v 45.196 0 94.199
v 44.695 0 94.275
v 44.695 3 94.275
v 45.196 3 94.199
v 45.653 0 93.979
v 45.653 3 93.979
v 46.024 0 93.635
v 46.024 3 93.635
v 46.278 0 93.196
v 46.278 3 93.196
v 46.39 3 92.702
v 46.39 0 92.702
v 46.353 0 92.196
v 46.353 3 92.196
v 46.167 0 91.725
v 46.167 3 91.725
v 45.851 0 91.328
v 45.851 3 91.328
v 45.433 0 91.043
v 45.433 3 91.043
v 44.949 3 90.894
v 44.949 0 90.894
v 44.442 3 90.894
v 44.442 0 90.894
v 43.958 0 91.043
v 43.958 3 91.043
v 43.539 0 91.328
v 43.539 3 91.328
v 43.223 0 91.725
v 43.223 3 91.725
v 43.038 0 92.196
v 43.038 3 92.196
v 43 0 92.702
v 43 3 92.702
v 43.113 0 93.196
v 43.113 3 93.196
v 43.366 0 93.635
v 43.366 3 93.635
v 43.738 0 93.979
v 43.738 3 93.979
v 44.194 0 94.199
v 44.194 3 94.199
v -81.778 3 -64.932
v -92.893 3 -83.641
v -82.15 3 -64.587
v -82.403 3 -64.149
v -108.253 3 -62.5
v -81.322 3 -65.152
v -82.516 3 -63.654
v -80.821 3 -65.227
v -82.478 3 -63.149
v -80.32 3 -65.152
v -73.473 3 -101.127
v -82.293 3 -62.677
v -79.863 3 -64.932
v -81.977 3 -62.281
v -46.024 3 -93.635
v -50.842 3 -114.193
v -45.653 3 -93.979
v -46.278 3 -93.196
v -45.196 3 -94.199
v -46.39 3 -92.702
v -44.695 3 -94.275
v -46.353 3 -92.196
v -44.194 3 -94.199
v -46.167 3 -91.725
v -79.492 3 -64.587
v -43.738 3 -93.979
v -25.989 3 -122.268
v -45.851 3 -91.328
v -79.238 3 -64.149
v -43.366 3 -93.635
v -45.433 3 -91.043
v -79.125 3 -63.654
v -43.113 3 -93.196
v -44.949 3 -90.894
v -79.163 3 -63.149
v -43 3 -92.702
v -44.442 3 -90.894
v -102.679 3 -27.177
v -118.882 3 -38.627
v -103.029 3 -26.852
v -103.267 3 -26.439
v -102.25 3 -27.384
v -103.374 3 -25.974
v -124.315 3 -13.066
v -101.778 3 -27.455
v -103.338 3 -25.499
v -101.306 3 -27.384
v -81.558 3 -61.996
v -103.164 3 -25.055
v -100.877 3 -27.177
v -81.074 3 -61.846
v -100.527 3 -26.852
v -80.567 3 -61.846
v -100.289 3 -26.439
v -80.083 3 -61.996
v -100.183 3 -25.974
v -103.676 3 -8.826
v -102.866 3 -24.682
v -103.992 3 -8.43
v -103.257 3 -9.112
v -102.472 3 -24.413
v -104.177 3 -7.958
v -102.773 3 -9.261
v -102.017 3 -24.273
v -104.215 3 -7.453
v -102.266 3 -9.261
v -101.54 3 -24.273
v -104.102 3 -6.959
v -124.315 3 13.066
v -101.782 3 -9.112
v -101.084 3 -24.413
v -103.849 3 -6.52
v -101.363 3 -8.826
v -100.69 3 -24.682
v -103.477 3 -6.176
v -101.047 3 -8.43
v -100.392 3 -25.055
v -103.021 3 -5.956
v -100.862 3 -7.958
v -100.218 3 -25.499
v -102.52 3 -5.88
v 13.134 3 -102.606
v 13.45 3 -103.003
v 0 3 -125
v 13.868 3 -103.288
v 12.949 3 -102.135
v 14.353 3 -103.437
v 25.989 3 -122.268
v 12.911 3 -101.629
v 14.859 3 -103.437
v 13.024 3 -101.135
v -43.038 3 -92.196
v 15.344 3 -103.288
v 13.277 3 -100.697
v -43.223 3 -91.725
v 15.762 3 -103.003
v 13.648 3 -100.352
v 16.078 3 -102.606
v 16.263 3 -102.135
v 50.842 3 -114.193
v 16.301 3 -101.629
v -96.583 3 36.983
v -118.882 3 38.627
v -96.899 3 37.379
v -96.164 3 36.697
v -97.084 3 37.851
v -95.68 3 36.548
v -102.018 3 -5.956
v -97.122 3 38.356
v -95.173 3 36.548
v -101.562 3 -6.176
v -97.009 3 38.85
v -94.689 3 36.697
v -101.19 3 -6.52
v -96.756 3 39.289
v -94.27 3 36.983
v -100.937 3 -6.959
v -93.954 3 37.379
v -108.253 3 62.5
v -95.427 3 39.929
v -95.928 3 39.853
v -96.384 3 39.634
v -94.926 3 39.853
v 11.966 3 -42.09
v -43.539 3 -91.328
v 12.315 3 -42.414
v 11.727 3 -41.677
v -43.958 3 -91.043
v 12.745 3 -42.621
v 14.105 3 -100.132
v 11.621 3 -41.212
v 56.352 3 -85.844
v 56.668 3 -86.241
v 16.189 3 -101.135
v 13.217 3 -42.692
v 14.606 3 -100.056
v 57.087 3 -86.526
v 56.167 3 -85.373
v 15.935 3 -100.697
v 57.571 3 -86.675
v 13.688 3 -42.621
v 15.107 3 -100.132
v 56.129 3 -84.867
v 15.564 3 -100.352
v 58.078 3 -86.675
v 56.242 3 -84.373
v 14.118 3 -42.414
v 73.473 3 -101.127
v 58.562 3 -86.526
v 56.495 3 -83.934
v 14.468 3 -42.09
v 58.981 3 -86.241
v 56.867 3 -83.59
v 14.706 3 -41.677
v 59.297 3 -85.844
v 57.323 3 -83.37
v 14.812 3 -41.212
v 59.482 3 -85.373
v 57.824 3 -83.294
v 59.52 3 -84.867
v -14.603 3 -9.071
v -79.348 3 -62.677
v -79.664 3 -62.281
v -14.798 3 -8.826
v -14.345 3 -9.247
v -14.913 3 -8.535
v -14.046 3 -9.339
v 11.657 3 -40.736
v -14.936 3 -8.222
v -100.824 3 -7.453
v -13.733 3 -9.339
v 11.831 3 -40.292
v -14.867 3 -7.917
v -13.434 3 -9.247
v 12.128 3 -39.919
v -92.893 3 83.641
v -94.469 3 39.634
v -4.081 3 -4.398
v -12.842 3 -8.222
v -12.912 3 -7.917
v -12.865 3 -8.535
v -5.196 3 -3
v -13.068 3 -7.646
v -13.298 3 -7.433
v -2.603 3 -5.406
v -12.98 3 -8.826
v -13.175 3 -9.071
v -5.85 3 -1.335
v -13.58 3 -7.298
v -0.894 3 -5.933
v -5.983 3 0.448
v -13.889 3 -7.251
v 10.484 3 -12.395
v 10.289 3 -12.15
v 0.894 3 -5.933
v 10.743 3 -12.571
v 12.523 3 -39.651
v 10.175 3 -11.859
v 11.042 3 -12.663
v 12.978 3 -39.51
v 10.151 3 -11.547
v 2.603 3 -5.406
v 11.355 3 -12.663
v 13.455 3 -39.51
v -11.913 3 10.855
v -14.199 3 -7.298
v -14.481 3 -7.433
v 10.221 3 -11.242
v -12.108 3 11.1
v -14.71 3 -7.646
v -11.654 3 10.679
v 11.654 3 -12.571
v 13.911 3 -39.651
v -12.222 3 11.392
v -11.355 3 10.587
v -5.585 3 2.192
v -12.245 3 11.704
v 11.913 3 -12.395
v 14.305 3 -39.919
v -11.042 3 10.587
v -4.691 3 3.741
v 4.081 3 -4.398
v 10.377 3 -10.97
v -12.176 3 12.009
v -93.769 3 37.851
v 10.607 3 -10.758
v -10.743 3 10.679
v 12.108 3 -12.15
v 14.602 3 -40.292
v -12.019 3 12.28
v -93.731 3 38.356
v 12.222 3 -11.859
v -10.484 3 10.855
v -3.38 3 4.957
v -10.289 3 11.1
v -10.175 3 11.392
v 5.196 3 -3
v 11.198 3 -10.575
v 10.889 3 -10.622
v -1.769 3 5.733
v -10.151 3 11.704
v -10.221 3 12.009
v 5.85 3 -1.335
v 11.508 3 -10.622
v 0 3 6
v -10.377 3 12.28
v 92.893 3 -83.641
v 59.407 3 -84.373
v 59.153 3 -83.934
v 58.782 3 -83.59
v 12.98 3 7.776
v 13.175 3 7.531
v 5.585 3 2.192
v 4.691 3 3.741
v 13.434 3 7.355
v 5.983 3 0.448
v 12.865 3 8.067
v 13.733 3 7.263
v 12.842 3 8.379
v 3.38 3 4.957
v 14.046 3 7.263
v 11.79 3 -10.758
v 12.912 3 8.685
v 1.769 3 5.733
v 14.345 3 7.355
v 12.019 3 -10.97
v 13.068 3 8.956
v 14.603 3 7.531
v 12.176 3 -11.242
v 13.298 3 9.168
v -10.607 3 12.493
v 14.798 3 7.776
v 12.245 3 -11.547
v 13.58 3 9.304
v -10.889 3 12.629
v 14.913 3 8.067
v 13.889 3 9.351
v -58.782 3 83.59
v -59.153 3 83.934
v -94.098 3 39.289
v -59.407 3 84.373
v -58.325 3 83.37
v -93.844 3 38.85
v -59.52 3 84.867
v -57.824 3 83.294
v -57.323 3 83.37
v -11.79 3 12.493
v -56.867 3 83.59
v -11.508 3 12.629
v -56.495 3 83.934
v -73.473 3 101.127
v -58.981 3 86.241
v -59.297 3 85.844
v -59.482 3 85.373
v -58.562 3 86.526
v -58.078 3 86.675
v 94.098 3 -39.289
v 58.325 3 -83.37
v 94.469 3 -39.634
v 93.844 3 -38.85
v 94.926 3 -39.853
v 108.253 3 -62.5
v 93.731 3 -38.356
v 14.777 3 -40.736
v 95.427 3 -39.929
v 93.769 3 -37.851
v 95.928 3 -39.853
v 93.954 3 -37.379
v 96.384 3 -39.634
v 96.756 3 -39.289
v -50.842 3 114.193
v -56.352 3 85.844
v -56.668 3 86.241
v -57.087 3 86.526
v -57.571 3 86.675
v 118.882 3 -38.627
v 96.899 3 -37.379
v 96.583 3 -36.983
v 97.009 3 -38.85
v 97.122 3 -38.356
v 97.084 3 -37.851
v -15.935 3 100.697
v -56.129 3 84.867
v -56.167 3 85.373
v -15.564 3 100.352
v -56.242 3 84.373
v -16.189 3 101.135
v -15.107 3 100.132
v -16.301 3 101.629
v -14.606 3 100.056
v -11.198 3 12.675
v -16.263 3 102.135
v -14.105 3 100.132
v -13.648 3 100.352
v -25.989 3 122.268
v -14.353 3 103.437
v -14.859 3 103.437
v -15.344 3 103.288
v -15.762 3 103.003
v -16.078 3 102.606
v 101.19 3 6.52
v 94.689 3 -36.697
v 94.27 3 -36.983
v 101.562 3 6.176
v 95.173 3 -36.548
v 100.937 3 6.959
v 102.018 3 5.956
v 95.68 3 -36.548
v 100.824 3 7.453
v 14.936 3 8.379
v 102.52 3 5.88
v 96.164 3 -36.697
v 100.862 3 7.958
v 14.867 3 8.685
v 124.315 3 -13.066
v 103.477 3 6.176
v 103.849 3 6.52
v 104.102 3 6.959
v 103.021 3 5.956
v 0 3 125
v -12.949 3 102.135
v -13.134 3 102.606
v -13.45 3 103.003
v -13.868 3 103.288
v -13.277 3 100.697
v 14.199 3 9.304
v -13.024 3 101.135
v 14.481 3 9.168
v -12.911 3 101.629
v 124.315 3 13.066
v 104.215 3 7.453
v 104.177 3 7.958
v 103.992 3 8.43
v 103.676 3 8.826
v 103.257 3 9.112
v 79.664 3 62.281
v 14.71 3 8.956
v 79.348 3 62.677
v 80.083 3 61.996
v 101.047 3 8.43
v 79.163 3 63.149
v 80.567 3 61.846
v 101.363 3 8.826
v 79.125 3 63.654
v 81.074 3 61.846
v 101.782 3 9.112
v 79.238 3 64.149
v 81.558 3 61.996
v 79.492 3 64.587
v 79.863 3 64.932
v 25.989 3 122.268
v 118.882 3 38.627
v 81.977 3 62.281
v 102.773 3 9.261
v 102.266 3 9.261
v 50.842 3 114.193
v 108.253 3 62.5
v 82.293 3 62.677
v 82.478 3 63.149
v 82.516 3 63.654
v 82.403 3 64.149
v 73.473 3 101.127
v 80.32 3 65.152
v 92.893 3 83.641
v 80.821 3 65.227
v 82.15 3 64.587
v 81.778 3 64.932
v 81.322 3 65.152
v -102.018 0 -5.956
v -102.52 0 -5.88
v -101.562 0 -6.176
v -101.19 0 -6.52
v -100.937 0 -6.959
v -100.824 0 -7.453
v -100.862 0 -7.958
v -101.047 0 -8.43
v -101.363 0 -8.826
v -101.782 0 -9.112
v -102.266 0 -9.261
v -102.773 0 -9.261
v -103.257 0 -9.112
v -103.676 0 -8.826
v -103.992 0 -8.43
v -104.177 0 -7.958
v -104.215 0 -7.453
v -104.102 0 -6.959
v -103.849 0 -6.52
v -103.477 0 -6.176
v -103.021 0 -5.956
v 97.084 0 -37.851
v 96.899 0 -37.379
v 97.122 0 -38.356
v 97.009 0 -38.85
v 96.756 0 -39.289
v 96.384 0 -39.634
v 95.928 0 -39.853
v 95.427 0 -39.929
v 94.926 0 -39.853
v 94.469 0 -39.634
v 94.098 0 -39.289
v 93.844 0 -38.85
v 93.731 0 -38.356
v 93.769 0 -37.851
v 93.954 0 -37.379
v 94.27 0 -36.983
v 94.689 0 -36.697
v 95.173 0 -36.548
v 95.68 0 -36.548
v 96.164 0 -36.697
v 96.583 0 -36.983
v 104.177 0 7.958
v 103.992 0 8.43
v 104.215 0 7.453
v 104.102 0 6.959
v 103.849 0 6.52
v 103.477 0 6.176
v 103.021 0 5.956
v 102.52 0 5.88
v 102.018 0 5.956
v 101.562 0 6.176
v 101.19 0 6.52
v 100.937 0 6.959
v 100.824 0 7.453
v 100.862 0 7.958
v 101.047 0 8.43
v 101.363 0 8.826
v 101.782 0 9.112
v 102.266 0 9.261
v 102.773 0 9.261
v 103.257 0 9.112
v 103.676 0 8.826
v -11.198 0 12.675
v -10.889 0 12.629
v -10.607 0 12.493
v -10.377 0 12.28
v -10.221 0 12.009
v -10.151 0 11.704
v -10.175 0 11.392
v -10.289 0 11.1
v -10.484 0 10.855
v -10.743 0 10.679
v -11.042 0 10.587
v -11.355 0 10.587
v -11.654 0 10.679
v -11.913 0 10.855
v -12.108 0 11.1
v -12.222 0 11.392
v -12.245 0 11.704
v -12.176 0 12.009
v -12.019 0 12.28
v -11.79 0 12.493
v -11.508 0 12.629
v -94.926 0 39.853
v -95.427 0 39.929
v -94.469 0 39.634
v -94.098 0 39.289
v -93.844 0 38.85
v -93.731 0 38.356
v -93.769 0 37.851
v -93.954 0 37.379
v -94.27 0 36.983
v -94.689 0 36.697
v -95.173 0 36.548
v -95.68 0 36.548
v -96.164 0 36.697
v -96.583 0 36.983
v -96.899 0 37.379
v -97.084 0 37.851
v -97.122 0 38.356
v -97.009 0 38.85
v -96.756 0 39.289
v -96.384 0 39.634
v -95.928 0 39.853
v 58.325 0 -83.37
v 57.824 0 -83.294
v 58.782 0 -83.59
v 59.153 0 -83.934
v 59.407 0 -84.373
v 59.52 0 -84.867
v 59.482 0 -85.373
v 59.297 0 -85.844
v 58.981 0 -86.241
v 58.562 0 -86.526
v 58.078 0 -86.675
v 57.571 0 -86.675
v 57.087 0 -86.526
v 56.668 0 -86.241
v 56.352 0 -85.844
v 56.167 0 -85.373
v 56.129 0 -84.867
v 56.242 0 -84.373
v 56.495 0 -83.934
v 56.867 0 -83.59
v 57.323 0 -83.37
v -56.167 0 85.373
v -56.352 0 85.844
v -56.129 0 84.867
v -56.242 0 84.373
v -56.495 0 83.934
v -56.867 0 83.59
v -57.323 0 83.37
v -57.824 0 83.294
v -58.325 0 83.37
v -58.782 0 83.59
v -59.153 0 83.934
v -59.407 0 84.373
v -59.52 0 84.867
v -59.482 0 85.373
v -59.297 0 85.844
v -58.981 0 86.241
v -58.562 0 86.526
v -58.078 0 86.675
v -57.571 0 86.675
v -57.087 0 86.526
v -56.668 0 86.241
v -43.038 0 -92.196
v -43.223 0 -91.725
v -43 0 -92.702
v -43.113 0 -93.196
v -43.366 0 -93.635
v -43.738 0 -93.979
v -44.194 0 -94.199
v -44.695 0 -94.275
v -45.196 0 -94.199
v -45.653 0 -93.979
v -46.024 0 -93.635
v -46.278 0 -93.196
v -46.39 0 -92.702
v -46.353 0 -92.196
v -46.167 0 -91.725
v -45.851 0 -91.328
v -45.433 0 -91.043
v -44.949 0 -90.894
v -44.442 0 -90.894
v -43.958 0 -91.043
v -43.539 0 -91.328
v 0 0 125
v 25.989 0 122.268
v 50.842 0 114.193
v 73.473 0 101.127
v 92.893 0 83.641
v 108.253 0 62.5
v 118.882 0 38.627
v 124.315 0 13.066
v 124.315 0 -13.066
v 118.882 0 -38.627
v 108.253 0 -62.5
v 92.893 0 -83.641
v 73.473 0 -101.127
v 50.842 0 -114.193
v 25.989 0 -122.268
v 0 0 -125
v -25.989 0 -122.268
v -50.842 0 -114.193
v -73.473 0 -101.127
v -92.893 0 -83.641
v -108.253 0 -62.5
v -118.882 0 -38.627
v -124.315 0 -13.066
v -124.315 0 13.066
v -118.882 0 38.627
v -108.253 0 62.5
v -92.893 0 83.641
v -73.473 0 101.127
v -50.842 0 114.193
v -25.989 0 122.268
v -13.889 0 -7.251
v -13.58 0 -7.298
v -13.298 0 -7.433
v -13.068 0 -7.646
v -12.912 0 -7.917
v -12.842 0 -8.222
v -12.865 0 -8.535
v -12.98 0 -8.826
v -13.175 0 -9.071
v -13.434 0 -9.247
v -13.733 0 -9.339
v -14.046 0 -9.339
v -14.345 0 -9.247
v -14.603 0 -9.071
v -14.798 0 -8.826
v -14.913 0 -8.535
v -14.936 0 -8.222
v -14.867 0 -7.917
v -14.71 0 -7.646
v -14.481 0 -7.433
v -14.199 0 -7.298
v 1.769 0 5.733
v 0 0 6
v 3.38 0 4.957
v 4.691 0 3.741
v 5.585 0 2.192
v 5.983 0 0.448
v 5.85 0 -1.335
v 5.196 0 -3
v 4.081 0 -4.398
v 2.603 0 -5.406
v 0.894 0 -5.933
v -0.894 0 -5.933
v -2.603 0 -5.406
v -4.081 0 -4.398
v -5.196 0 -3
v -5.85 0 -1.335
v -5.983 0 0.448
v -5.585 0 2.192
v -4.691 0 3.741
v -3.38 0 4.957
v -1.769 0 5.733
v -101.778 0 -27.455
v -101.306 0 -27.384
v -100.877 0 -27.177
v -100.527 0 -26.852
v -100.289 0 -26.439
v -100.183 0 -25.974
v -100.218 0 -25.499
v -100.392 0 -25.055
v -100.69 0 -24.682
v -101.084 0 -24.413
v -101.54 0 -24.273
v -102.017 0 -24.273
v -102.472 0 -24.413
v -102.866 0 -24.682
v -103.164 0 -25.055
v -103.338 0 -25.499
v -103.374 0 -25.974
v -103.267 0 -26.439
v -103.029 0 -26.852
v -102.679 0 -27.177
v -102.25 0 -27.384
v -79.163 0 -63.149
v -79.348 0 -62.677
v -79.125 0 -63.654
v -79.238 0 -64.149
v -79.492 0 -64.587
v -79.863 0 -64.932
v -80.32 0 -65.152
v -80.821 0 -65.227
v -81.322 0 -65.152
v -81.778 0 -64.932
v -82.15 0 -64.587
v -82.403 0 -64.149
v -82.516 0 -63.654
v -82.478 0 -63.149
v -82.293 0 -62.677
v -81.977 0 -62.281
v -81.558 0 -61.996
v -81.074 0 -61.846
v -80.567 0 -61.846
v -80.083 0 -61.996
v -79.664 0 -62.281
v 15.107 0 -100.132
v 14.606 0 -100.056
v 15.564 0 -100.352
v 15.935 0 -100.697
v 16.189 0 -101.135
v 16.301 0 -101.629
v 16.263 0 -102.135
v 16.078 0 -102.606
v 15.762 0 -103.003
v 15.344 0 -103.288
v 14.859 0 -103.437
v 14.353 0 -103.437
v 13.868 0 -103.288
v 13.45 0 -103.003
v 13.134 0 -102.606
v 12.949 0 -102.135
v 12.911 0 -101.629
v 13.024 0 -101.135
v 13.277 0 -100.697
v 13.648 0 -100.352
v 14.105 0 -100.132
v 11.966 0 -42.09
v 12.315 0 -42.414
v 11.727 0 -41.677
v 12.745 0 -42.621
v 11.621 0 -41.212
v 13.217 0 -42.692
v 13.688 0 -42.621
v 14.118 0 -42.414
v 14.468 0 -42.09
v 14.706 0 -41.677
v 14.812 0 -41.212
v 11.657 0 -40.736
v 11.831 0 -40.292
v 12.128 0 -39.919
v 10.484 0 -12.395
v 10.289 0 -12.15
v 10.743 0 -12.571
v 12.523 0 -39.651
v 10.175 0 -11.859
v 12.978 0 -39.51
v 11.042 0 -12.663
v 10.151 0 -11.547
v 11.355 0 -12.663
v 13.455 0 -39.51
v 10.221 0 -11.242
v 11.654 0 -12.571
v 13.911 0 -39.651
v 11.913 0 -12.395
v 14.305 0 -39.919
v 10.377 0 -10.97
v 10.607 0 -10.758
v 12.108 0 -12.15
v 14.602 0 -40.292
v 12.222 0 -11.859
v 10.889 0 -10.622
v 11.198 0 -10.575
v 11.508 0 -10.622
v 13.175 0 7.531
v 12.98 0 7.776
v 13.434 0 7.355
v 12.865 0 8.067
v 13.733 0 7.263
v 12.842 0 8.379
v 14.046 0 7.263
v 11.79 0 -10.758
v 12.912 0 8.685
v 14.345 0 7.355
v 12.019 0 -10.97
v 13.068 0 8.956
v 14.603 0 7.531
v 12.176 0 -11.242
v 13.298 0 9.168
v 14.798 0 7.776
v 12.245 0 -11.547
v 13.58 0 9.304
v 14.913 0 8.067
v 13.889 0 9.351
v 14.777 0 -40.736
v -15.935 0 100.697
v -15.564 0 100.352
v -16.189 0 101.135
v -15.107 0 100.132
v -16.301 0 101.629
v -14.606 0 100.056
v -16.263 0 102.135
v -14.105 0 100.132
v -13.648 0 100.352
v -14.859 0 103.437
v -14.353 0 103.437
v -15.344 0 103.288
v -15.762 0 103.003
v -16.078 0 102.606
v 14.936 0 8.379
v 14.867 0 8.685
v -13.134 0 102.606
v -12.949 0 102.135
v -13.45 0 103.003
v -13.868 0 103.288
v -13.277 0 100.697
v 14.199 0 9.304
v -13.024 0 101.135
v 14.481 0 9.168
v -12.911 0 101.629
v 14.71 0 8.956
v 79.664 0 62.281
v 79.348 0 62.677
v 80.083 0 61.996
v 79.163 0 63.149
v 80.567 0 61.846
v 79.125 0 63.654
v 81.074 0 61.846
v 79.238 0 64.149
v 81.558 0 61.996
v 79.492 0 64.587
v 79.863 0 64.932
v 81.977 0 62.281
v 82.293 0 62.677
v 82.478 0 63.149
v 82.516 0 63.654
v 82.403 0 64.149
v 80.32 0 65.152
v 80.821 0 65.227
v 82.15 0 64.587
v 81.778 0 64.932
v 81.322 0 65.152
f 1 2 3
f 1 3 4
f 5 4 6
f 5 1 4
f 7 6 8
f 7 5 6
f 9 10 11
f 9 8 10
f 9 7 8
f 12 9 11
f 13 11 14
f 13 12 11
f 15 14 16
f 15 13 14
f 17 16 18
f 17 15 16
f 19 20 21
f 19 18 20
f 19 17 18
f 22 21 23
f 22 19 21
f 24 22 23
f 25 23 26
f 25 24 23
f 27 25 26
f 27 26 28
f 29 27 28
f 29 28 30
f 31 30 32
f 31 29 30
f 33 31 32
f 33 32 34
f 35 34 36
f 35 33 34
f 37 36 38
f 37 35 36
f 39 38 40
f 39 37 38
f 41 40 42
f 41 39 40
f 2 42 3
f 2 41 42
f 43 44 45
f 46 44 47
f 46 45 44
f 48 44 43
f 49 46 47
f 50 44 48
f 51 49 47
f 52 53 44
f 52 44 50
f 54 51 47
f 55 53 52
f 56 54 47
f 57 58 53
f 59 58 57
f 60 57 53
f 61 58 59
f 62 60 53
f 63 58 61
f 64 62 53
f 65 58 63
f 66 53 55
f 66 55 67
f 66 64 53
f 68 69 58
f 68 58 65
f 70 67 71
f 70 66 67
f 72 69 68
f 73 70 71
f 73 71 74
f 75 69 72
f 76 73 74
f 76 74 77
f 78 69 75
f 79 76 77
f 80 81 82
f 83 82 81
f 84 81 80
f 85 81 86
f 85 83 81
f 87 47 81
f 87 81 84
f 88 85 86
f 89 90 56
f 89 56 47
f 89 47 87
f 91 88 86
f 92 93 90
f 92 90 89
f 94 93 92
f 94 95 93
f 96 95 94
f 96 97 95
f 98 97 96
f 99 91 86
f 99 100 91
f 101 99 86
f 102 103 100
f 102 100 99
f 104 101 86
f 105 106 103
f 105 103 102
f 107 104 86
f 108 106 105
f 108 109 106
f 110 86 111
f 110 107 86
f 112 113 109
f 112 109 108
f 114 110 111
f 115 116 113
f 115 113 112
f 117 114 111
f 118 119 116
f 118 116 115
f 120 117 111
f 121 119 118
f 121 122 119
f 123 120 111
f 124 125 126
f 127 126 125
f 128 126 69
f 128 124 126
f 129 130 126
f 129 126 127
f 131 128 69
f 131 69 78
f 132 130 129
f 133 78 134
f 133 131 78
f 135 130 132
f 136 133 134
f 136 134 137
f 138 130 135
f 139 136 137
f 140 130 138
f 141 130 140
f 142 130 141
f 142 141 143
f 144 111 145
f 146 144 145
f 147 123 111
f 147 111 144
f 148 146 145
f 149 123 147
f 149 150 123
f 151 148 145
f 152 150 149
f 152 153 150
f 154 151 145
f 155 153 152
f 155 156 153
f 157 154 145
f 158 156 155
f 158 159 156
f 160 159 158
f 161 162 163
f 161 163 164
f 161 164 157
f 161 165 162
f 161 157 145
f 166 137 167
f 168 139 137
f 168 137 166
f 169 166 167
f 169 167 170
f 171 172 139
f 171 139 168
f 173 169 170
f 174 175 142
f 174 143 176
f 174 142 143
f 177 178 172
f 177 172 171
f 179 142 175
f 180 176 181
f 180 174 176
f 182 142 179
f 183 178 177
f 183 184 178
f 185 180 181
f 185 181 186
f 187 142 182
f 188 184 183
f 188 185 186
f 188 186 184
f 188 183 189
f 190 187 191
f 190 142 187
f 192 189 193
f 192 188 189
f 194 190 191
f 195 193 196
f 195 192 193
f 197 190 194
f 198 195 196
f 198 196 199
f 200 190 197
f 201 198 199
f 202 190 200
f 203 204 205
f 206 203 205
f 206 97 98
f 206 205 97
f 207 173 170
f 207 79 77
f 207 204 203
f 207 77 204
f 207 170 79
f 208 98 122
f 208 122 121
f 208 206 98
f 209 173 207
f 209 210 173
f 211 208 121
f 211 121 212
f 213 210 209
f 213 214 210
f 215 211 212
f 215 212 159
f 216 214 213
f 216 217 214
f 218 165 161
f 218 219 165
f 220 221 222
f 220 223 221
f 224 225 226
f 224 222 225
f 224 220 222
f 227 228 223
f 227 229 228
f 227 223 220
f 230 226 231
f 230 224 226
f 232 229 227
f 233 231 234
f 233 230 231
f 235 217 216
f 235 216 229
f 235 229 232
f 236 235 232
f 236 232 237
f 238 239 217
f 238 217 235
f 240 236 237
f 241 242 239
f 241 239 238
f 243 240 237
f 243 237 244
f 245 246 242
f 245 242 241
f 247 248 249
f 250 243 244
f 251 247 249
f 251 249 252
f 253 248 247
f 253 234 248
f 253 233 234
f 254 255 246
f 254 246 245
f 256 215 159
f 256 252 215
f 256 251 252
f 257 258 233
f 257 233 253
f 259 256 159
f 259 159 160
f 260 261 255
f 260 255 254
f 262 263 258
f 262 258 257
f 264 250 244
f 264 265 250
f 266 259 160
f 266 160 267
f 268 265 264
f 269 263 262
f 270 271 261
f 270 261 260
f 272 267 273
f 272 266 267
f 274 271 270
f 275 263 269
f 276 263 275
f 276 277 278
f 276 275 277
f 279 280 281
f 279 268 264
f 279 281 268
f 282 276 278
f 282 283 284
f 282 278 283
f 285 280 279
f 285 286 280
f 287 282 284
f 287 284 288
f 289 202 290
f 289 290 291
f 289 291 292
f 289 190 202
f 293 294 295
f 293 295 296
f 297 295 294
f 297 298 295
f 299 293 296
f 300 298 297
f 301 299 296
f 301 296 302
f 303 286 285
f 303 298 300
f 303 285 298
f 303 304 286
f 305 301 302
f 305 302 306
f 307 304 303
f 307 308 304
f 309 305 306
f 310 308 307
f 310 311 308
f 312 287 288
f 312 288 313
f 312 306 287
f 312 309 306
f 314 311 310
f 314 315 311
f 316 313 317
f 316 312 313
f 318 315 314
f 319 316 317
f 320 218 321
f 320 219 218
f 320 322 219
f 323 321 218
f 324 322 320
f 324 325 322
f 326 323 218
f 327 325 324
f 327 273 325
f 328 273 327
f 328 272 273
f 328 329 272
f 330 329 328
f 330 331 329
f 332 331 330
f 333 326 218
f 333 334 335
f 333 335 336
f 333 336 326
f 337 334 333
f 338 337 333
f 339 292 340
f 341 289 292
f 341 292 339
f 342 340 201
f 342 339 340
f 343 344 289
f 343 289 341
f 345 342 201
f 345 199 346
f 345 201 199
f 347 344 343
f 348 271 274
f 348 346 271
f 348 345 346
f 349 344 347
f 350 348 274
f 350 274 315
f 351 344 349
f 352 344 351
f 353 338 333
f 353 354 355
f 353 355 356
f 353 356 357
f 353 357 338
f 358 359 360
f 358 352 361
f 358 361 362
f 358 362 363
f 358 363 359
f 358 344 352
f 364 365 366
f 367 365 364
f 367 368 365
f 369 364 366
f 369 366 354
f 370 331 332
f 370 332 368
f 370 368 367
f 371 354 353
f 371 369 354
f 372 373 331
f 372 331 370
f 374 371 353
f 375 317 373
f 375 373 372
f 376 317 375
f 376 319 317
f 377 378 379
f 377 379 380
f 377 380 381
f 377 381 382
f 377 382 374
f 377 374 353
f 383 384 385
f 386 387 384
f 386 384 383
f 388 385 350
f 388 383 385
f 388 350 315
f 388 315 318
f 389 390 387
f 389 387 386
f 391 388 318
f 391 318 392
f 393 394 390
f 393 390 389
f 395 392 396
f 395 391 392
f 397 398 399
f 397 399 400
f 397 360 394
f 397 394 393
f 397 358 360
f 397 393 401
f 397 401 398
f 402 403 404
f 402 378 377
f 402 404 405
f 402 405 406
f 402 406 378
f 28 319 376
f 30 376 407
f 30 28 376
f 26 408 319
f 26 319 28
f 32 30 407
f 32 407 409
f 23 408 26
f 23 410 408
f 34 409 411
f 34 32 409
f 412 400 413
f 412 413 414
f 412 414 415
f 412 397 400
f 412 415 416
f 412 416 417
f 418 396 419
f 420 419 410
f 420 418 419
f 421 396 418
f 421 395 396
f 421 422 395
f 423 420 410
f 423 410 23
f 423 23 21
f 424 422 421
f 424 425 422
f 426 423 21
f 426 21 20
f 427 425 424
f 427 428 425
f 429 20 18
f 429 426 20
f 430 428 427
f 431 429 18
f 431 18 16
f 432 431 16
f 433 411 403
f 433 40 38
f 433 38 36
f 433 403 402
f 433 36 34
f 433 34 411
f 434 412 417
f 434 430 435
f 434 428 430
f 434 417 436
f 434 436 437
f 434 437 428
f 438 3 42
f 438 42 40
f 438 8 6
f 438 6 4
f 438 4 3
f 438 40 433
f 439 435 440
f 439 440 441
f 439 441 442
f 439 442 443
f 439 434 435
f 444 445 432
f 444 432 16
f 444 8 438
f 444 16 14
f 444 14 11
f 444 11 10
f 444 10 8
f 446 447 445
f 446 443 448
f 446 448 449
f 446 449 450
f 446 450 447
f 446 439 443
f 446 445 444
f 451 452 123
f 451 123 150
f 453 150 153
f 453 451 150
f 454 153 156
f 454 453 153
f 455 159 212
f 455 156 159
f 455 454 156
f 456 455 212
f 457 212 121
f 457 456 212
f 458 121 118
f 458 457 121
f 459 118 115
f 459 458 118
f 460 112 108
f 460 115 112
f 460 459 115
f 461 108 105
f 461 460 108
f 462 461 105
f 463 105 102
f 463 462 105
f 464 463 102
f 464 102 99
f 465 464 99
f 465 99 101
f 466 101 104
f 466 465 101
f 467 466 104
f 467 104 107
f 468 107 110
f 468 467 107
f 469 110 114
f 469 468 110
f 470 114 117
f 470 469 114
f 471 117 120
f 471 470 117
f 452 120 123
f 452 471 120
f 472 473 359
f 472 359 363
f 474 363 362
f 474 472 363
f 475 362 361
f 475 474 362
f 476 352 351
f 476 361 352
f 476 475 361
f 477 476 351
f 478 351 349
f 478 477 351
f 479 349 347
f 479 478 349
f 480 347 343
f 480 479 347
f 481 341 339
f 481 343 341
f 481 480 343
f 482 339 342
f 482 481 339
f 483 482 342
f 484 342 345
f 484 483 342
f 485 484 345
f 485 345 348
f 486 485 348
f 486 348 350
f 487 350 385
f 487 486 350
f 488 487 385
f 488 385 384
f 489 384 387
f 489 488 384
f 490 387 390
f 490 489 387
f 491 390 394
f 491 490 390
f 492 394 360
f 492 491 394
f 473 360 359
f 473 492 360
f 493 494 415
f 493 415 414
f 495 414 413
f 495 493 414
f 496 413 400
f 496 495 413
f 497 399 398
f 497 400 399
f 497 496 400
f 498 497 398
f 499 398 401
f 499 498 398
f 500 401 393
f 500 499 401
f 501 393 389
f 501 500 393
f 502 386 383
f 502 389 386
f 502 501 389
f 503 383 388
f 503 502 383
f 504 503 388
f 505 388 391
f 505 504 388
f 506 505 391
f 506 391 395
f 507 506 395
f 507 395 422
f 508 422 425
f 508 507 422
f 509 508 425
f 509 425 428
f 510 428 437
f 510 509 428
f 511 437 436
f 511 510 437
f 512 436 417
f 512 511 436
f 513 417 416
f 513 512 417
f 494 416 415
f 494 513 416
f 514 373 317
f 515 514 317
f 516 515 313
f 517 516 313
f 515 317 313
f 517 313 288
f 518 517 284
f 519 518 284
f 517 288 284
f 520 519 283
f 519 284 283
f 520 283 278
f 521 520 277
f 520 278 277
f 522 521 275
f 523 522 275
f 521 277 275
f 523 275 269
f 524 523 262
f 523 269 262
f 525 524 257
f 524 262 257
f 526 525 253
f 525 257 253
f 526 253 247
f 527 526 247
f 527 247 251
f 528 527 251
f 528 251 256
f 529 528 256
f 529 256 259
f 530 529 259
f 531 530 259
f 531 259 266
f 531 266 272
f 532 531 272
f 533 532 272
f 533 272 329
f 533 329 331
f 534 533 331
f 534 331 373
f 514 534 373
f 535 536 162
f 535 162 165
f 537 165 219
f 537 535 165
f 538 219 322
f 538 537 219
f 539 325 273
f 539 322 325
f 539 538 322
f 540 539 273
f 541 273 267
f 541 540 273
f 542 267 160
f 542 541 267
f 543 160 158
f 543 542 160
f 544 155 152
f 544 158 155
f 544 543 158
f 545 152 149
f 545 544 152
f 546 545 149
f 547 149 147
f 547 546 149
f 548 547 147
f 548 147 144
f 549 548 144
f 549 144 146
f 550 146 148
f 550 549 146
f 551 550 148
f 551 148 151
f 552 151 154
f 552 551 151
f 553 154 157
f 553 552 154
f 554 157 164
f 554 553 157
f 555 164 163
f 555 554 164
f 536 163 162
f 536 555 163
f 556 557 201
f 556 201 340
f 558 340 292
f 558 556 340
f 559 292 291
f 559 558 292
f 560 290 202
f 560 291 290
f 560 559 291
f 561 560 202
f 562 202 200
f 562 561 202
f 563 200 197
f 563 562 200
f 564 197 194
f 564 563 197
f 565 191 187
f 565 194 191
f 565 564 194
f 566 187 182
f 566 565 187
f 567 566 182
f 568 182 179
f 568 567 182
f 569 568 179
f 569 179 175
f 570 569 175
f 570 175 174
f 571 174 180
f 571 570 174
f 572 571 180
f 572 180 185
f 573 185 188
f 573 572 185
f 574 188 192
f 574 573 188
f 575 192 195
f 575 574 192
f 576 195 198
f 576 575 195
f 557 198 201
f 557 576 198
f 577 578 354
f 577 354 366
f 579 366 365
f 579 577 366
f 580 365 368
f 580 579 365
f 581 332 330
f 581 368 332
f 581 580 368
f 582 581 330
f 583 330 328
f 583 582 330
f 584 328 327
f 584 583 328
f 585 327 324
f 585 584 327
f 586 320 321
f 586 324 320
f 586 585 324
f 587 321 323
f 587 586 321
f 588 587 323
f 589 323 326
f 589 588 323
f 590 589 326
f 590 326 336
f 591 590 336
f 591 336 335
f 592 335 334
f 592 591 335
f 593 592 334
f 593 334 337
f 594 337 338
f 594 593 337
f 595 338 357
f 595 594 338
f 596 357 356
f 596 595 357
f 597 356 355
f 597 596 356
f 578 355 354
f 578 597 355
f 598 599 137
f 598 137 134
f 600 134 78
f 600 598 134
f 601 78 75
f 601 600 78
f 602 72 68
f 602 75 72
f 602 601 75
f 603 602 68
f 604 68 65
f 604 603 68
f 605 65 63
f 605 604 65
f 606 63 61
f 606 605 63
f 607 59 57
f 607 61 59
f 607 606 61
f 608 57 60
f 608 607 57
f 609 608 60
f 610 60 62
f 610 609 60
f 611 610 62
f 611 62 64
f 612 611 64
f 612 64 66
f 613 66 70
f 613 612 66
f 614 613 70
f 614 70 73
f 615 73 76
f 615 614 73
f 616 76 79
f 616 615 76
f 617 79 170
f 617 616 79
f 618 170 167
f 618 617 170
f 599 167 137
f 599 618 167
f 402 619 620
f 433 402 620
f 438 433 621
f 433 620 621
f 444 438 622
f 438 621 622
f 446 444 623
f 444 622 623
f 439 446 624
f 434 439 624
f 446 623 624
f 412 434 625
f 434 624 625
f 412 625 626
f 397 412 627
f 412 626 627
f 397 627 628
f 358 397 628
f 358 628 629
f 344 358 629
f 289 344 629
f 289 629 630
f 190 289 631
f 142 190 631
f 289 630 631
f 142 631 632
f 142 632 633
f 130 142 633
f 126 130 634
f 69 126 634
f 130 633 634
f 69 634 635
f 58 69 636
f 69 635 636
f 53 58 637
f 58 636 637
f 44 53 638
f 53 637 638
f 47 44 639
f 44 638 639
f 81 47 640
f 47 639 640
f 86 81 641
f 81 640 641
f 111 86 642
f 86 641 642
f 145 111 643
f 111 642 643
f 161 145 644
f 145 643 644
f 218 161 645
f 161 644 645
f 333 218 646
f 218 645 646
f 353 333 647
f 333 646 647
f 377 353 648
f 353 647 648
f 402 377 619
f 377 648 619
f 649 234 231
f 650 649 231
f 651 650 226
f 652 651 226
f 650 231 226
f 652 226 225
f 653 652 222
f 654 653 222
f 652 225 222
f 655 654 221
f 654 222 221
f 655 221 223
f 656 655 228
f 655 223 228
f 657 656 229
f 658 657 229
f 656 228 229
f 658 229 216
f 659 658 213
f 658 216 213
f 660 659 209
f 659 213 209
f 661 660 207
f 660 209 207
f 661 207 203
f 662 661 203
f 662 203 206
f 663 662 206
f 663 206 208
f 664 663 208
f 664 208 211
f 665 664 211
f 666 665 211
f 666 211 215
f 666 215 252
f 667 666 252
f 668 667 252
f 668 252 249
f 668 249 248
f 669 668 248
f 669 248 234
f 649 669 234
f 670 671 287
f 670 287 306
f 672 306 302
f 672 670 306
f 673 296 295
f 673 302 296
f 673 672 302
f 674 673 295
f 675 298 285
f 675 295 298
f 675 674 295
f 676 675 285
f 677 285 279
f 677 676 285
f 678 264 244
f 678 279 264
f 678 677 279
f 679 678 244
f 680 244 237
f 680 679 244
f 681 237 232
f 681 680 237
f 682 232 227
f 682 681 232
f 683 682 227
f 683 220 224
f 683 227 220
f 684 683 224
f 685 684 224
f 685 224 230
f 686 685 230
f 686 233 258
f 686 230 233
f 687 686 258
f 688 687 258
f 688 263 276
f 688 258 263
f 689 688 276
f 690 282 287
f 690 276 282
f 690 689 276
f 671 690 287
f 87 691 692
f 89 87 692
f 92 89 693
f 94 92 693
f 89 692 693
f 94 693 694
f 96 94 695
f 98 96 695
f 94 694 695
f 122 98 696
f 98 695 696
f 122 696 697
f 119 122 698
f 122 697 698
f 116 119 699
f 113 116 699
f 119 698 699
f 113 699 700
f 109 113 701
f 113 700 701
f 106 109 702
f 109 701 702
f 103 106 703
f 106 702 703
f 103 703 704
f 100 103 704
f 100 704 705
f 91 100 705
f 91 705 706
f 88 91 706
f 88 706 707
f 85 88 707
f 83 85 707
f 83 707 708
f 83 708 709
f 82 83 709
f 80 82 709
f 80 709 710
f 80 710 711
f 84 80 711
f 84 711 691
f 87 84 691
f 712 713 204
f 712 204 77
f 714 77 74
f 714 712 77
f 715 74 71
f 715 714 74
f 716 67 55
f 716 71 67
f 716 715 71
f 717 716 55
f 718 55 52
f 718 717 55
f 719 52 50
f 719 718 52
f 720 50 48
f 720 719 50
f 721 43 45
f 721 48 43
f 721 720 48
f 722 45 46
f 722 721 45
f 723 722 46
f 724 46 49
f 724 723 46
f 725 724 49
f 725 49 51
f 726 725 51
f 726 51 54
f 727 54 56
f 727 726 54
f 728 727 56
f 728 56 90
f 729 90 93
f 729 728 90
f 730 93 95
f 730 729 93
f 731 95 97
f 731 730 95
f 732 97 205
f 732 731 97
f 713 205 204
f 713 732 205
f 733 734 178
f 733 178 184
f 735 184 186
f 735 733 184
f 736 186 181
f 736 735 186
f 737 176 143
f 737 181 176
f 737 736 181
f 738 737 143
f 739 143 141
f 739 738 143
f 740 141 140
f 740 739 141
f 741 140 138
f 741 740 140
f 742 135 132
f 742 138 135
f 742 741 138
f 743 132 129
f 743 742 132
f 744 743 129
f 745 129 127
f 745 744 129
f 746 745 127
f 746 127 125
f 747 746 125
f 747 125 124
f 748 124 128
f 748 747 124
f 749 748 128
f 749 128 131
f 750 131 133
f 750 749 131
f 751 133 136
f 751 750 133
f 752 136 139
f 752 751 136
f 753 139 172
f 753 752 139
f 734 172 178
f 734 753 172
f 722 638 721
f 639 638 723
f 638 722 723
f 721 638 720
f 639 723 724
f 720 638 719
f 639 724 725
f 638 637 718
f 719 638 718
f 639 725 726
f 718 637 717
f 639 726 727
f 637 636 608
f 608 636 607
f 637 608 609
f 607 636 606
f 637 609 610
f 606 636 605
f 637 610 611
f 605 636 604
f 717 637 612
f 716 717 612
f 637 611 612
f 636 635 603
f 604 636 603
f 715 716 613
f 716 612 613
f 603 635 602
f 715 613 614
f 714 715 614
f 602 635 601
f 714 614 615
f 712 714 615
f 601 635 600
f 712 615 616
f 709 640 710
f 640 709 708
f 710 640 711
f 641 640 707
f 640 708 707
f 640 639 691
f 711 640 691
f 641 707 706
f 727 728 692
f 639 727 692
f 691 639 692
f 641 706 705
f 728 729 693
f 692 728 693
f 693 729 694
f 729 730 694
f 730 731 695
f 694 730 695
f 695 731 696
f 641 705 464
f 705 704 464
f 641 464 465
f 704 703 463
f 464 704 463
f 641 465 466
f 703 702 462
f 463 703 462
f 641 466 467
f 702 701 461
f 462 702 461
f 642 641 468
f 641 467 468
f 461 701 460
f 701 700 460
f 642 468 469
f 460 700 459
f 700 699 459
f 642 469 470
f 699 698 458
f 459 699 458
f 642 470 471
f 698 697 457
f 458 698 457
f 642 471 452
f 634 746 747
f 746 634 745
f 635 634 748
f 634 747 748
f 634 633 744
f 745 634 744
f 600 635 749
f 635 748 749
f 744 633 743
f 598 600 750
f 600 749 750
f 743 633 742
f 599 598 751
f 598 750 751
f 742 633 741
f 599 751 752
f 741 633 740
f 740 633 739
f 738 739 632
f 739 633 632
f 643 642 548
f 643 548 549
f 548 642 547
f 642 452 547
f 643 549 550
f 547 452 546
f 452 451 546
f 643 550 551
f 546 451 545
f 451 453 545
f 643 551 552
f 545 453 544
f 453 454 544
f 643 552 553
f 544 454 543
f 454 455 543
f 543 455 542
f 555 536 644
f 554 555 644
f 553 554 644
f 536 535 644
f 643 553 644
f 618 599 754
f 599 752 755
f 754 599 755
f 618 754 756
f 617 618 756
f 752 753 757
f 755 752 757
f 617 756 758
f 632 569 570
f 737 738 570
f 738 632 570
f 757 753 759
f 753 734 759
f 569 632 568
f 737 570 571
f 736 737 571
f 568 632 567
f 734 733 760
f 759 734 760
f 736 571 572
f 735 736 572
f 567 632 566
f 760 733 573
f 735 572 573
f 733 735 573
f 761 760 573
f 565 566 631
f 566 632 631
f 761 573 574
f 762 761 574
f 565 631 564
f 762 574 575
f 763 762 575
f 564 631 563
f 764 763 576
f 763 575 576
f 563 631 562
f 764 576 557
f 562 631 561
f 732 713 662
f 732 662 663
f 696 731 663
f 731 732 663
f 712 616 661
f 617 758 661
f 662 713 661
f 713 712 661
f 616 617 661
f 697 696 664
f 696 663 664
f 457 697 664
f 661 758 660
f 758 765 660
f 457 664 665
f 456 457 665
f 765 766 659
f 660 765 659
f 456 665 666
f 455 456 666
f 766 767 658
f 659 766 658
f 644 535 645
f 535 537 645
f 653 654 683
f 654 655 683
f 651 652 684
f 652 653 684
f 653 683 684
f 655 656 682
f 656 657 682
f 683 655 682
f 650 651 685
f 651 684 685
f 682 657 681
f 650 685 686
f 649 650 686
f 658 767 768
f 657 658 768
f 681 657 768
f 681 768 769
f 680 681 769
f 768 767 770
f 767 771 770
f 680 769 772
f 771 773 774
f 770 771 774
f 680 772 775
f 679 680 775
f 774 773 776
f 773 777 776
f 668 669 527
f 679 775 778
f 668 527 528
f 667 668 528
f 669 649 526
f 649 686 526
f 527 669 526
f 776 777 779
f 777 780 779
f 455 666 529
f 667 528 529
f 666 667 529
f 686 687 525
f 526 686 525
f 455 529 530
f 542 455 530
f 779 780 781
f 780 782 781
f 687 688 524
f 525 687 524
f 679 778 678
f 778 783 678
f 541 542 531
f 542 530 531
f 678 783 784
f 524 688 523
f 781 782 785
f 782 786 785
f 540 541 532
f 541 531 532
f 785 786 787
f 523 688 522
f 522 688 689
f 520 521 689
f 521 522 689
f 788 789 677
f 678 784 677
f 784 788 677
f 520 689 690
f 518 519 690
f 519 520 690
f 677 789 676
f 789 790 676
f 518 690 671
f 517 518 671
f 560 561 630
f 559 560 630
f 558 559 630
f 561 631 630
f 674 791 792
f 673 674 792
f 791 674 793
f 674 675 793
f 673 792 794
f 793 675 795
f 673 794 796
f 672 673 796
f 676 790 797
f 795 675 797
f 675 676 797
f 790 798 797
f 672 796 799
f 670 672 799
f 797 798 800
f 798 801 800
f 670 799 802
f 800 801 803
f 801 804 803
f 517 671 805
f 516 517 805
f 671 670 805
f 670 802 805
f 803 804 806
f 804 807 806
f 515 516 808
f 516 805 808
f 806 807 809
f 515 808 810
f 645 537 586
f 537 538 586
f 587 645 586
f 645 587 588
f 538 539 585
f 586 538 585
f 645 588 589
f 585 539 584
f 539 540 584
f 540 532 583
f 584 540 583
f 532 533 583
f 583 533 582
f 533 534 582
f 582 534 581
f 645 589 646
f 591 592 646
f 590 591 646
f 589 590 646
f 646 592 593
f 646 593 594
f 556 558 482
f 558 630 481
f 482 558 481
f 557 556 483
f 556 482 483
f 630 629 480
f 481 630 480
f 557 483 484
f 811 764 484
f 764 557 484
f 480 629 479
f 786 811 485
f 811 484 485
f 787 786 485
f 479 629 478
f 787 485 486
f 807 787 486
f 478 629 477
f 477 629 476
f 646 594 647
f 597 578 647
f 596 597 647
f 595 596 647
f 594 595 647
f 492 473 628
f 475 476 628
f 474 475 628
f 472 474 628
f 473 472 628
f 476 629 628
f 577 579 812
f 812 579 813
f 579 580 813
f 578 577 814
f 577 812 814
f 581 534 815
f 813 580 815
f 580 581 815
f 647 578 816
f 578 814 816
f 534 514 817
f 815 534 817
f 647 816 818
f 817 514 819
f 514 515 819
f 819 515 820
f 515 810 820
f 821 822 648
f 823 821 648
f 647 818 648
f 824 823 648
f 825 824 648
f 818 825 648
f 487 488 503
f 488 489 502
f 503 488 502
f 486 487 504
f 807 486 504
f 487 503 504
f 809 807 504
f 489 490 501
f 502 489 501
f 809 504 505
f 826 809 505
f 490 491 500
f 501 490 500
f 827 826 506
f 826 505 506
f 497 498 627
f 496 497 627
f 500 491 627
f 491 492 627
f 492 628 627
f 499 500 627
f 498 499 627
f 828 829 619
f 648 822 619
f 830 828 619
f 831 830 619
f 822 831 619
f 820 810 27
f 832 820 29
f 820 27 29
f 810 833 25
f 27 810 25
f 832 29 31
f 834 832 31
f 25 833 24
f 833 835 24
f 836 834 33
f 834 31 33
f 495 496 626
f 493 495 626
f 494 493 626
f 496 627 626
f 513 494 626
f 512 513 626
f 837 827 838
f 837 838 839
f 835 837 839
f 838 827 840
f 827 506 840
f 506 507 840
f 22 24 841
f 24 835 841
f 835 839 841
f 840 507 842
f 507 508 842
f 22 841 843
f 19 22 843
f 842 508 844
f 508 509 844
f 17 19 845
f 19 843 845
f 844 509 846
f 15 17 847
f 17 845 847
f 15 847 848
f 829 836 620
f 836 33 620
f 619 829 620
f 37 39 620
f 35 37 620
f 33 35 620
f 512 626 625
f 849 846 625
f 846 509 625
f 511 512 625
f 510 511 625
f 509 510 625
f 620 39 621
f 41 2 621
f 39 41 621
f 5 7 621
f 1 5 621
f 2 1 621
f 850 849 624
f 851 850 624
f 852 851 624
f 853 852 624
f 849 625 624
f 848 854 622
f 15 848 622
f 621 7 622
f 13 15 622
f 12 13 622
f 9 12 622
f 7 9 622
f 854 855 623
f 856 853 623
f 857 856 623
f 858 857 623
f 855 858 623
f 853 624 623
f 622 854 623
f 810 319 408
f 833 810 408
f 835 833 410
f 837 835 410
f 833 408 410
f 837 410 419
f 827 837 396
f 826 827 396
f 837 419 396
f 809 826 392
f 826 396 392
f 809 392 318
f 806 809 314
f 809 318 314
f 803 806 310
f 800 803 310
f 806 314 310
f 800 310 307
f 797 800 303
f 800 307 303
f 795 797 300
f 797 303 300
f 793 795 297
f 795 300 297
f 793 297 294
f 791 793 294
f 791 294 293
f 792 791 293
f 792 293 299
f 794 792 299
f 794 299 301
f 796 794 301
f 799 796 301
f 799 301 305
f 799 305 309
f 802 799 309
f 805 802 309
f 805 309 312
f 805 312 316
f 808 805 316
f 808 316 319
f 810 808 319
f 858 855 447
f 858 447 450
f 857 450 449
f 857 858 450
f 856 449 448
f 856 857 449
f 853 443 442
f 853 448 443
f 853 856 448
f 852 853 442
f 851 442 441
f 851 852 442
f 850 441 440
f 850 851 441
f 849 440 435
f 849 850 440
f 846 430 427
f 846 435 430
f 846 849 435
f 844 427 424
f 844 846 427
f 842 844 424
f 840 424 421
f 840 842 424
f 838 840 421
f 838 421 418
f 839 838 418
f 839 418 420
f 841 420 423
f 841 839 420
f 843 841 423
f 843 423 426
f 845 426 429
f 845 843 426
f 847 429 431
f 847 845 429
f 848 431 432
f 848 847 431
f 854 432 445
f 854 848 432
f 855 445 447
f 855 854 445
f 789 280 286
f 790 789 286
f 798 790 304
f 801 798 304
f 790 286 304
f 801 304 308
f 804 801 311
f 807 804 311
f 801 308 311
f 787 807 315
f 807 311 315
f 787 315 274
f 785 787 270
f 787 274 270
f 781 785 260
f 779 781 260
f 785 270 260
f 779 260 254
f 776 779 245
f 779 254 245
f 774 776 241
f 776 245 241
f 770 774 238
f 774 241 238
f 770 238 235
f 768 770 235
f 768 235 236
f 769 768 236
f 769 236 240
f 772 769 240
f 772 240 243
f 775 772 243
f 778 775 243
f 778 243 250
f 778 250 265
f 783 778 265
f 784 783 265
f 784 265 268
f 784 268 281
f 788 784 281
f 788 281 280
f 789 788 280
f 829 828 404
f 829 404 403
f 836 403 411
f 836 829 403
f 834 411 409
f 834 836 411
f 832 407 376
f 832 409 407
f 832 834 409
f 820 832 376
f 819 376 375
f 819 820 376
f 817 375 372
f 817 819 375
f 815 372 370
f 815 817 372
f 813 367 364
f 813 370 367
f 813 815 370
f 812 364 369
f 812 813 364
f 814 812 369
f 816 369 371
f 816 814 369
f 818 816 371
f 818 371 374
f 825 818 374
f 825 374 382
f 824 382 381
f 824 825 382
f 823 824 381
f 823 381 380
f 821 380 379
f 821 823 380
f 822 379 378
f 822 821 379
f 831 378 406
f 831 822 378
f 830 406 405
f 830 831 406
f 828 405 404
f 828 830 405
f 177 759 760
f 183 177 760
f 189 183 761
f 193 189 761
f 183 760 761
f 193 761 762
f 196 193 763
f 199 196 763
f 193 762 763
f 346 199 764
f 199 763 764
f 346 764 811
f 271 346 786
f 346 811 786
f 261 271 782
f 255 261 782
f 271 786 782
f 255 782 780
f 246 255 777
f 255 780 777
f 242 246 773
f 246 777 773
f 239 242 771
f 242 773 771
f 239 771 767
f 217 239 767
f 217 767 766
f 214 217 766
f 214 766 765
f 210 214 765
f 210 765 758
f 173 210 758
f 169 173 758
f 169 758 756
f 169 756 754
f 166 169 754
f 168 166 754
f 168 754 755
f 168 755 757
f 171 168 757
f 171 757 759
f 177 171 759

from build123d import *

# Parameters (mm, degrees)
SKETCH2_R               = 125
BOSS_EXTRUDE1_DEPTH     = 3
CUT_EXTRUDE1_START      = -26
SKETCH3_R               = 1.7
CUT_EXTRUDE1_DEPTH      = 88
CUT_EXTRUDE2_DEPTH      = 55
CUT_EXTRUDE2_DEPTH_BACK = 12
SKETCH4_R               = 6
SKETCH5_R               = 1.6
CUT_EXTRUDE3_DEPTH      = 177.802149308
CUT_EXTRUDE4_REACH      = 178.802
SKETCH6_R               = 1.05
CIRPATTERN1_COUNT       = 6


with BuildPart() as part:
    # Sketch2 → Boss-Extrude1 (new body)
    with BuildSketch(Plane(origin=(0, 0, 0), x_dir=(1, 0, 0), z_dir=(0, 1, 0))):
        with Locations(Location((0, 0, 0), (0, 0, 270))):
            Circle(SKETCH2_R)
    extrude(amount=BOSS_EXTRUDE1_DEPTH)

    # Sketch3 → Cut-Extrude1 (cut)
    with BuildSketch(Plane(origin=(0, 3, 0), x_dir=(1, 0, 0), z_dir=(0, 1, 0)).offset(CUT_EXTRUDE1_START)):
        with Locations(Location((57.824361976, 84.994428132, 0), (0, 0, 270))):
            Circle(SKETCH3_R)
        with Locations(Location((14.606066285, 101.75643704, 0), (0, 0, 270))):
            Circle(SKETCH3_R)
        with Locations(Location((44.695152955, -92.574580495, 0), (0, 0, 270))):
            Circle(SKETCH3_R)
        with Locations(Location((80.820626333, -63.527442972, 0), (0, 0, 270))):
            Circle(SKETCH3_R)
        with Locations(Location((-102.519514931, 7.580152362, 0), (0, 0, 270))):
            Circle(SKETCH3_R)
        with Locations(Location((-95.426692618, -38.228994068, 0), (0, 0, 270))):
            Circle(SKETCH3_R)
    cut_extrude1 = extrude(amount=CUT_EXTRUDE1_DEPTH, mode=Mode.SUBTRACT)

    # Sketch4 → Cut-Extrude2 (cut, two sides: drawn at the far end of the back side and taken through both)
    with BuildSketch(Plane(origin=(0, 3, 0), x_dir=(1, 0, 0), z_dir=(0, 1, 0)).offset(-CUT_EXTRUDE2_DEPTH_BACK)):
        with Locations(Location((0, 0, 0), (0, 0, 270))):
            Circle(SKETCH4_R)
    extrude(amount=CUT_EXTRUDE2_DEPTH + CUT_EXTRUDE2_DEPTH_BACK, mode=Mode.SUBTRACT)

    # Sketch5 → Cut-Extrude3 (cut, through all)
    with BuildSketch(Plane.XZ):
        with Locations(Location((-101.778099897, -25.854755487, 0), (0, 0, 270))):
            Circle(SKETCH5_R)
        with Locations(Location((13.216774043, -41.092175458, 0), (0, 0, 270))):
            Circle(SKETCH5_R)
    extrude(amount=-CUT_EXTRUDE3_DEPTH, mode=Mode.SUBTRACT)

    # Sketch6 → Cut-Extrude4 (cut, up to next)
    with BuildSketch(Plane(origin=(0, 3, 0), x_dir=(1, 0, 0), z_dir=(0, 1, 0)), mode=Mode.PRIVATE) as cut_extrude4_sk1:
        with Locations(Location((11.198414604, 11.625148557, 0), (0, 0, 270))):
            Circle(SKETCH6_R)
    cut_extrude4_tool1 = extrude(cut_extrude4_sk1.sketch, amount=-CUT_EXTRUDE4_REACH, mode=Mode.PRIVATE) & part.part
    # Sketch6 → Cut-Extrude4 (cut, up to next)
    with BuildSketch(Plane(origin=(0, 3, 0), x_dir=(1, 0, 0), z_dir=(0, 1, 0)), mode=Mode.PRIVATE) as cut_extrude4_sk2:
        with Locations(Location((13.889158795, -8.300914364, 0), (0, 0, 270))):
            Circle(SKETCH6_R)
    cut_extrude4_tool2 = extrude(cut_extrude4_sk2.sketch, amount=-CUT_EXTRUDE4_REACH, mode=Mode.PRIVATE) & part.part
    # Sketch6 → Cut-Extrude4 (cut, up to next)
    with BuildSketch(Plane(origin=(0, 3, 0), x_dir=(1, 0, 0), z_dir=(0, 1, 0)), mode=Mode.PRIVATE) as cut_extrude4_sk3:
        with Locations(Location((-11.198414604, -11.625148557, 0), (0, 0, 270))):
            Circle(SKETCH6_R)
    cut_extrude4_tool3 = extrude(cut_extrude4_sk3.sketch, amount=-CUT_EXTRUDE4_REACH, mode=Mode.PRIVATE) & part.part
    # Sketch6 → Cut-Extrude4 (cut, up to next)
    with BuildSketch(Plane(origin=(0, 3, 0), x_dir=(1, 0, 0), z_dir=(0, 1, 0)), mode=Mode.PRIVATE) as cut_extrude4_sk4:
        with Locations(Location((-13.889158795, 8.300914364, 0), (0, 0, 270))):
            Circle(SKETCH6_R)
    cut_extrude4_tool4 = extrude(cut_extrude4_sk4.sketch, amount=-CUT_EXTRUDE4_REACH, mode=Mode.PRIVATE) & part.part
    add(cut_extrude4_tool1.solids().sort_by_distance((11.198415, 3, -11.625149))[0], mode=Mode.SUBTRACT)
    add(cut_extrude4_tool2.solids().sort_by_distance((13.889159, 3, 8.300914))[0], mode=Mode.SUBTRACT)
    add(cut_extrude4_tool3.solids().sort_by_distance((-11.198415, 3, 11.625149))[0], mode=Mode.SUBTRACT)
    add(cut_extrude4_tool4.solids().sort_by_distance((-13.889159, 3, -8.300914))[0], mode=Mode.SUBTRACT)

    # CirPattern1: Cut-Extrude1 ×6 about axis
    cirpattern1_axis = Axis((0, 0, 0), (0, 1, 0))
    for i in range(1, CIRPATTERN1_COUNT):
        add(cut_extrude1.rotate(cirpattern1_axis, i * 360 / CIRPATTERN1_COUNT), mode=Mode.SUBTRACT)


solid = part.part
